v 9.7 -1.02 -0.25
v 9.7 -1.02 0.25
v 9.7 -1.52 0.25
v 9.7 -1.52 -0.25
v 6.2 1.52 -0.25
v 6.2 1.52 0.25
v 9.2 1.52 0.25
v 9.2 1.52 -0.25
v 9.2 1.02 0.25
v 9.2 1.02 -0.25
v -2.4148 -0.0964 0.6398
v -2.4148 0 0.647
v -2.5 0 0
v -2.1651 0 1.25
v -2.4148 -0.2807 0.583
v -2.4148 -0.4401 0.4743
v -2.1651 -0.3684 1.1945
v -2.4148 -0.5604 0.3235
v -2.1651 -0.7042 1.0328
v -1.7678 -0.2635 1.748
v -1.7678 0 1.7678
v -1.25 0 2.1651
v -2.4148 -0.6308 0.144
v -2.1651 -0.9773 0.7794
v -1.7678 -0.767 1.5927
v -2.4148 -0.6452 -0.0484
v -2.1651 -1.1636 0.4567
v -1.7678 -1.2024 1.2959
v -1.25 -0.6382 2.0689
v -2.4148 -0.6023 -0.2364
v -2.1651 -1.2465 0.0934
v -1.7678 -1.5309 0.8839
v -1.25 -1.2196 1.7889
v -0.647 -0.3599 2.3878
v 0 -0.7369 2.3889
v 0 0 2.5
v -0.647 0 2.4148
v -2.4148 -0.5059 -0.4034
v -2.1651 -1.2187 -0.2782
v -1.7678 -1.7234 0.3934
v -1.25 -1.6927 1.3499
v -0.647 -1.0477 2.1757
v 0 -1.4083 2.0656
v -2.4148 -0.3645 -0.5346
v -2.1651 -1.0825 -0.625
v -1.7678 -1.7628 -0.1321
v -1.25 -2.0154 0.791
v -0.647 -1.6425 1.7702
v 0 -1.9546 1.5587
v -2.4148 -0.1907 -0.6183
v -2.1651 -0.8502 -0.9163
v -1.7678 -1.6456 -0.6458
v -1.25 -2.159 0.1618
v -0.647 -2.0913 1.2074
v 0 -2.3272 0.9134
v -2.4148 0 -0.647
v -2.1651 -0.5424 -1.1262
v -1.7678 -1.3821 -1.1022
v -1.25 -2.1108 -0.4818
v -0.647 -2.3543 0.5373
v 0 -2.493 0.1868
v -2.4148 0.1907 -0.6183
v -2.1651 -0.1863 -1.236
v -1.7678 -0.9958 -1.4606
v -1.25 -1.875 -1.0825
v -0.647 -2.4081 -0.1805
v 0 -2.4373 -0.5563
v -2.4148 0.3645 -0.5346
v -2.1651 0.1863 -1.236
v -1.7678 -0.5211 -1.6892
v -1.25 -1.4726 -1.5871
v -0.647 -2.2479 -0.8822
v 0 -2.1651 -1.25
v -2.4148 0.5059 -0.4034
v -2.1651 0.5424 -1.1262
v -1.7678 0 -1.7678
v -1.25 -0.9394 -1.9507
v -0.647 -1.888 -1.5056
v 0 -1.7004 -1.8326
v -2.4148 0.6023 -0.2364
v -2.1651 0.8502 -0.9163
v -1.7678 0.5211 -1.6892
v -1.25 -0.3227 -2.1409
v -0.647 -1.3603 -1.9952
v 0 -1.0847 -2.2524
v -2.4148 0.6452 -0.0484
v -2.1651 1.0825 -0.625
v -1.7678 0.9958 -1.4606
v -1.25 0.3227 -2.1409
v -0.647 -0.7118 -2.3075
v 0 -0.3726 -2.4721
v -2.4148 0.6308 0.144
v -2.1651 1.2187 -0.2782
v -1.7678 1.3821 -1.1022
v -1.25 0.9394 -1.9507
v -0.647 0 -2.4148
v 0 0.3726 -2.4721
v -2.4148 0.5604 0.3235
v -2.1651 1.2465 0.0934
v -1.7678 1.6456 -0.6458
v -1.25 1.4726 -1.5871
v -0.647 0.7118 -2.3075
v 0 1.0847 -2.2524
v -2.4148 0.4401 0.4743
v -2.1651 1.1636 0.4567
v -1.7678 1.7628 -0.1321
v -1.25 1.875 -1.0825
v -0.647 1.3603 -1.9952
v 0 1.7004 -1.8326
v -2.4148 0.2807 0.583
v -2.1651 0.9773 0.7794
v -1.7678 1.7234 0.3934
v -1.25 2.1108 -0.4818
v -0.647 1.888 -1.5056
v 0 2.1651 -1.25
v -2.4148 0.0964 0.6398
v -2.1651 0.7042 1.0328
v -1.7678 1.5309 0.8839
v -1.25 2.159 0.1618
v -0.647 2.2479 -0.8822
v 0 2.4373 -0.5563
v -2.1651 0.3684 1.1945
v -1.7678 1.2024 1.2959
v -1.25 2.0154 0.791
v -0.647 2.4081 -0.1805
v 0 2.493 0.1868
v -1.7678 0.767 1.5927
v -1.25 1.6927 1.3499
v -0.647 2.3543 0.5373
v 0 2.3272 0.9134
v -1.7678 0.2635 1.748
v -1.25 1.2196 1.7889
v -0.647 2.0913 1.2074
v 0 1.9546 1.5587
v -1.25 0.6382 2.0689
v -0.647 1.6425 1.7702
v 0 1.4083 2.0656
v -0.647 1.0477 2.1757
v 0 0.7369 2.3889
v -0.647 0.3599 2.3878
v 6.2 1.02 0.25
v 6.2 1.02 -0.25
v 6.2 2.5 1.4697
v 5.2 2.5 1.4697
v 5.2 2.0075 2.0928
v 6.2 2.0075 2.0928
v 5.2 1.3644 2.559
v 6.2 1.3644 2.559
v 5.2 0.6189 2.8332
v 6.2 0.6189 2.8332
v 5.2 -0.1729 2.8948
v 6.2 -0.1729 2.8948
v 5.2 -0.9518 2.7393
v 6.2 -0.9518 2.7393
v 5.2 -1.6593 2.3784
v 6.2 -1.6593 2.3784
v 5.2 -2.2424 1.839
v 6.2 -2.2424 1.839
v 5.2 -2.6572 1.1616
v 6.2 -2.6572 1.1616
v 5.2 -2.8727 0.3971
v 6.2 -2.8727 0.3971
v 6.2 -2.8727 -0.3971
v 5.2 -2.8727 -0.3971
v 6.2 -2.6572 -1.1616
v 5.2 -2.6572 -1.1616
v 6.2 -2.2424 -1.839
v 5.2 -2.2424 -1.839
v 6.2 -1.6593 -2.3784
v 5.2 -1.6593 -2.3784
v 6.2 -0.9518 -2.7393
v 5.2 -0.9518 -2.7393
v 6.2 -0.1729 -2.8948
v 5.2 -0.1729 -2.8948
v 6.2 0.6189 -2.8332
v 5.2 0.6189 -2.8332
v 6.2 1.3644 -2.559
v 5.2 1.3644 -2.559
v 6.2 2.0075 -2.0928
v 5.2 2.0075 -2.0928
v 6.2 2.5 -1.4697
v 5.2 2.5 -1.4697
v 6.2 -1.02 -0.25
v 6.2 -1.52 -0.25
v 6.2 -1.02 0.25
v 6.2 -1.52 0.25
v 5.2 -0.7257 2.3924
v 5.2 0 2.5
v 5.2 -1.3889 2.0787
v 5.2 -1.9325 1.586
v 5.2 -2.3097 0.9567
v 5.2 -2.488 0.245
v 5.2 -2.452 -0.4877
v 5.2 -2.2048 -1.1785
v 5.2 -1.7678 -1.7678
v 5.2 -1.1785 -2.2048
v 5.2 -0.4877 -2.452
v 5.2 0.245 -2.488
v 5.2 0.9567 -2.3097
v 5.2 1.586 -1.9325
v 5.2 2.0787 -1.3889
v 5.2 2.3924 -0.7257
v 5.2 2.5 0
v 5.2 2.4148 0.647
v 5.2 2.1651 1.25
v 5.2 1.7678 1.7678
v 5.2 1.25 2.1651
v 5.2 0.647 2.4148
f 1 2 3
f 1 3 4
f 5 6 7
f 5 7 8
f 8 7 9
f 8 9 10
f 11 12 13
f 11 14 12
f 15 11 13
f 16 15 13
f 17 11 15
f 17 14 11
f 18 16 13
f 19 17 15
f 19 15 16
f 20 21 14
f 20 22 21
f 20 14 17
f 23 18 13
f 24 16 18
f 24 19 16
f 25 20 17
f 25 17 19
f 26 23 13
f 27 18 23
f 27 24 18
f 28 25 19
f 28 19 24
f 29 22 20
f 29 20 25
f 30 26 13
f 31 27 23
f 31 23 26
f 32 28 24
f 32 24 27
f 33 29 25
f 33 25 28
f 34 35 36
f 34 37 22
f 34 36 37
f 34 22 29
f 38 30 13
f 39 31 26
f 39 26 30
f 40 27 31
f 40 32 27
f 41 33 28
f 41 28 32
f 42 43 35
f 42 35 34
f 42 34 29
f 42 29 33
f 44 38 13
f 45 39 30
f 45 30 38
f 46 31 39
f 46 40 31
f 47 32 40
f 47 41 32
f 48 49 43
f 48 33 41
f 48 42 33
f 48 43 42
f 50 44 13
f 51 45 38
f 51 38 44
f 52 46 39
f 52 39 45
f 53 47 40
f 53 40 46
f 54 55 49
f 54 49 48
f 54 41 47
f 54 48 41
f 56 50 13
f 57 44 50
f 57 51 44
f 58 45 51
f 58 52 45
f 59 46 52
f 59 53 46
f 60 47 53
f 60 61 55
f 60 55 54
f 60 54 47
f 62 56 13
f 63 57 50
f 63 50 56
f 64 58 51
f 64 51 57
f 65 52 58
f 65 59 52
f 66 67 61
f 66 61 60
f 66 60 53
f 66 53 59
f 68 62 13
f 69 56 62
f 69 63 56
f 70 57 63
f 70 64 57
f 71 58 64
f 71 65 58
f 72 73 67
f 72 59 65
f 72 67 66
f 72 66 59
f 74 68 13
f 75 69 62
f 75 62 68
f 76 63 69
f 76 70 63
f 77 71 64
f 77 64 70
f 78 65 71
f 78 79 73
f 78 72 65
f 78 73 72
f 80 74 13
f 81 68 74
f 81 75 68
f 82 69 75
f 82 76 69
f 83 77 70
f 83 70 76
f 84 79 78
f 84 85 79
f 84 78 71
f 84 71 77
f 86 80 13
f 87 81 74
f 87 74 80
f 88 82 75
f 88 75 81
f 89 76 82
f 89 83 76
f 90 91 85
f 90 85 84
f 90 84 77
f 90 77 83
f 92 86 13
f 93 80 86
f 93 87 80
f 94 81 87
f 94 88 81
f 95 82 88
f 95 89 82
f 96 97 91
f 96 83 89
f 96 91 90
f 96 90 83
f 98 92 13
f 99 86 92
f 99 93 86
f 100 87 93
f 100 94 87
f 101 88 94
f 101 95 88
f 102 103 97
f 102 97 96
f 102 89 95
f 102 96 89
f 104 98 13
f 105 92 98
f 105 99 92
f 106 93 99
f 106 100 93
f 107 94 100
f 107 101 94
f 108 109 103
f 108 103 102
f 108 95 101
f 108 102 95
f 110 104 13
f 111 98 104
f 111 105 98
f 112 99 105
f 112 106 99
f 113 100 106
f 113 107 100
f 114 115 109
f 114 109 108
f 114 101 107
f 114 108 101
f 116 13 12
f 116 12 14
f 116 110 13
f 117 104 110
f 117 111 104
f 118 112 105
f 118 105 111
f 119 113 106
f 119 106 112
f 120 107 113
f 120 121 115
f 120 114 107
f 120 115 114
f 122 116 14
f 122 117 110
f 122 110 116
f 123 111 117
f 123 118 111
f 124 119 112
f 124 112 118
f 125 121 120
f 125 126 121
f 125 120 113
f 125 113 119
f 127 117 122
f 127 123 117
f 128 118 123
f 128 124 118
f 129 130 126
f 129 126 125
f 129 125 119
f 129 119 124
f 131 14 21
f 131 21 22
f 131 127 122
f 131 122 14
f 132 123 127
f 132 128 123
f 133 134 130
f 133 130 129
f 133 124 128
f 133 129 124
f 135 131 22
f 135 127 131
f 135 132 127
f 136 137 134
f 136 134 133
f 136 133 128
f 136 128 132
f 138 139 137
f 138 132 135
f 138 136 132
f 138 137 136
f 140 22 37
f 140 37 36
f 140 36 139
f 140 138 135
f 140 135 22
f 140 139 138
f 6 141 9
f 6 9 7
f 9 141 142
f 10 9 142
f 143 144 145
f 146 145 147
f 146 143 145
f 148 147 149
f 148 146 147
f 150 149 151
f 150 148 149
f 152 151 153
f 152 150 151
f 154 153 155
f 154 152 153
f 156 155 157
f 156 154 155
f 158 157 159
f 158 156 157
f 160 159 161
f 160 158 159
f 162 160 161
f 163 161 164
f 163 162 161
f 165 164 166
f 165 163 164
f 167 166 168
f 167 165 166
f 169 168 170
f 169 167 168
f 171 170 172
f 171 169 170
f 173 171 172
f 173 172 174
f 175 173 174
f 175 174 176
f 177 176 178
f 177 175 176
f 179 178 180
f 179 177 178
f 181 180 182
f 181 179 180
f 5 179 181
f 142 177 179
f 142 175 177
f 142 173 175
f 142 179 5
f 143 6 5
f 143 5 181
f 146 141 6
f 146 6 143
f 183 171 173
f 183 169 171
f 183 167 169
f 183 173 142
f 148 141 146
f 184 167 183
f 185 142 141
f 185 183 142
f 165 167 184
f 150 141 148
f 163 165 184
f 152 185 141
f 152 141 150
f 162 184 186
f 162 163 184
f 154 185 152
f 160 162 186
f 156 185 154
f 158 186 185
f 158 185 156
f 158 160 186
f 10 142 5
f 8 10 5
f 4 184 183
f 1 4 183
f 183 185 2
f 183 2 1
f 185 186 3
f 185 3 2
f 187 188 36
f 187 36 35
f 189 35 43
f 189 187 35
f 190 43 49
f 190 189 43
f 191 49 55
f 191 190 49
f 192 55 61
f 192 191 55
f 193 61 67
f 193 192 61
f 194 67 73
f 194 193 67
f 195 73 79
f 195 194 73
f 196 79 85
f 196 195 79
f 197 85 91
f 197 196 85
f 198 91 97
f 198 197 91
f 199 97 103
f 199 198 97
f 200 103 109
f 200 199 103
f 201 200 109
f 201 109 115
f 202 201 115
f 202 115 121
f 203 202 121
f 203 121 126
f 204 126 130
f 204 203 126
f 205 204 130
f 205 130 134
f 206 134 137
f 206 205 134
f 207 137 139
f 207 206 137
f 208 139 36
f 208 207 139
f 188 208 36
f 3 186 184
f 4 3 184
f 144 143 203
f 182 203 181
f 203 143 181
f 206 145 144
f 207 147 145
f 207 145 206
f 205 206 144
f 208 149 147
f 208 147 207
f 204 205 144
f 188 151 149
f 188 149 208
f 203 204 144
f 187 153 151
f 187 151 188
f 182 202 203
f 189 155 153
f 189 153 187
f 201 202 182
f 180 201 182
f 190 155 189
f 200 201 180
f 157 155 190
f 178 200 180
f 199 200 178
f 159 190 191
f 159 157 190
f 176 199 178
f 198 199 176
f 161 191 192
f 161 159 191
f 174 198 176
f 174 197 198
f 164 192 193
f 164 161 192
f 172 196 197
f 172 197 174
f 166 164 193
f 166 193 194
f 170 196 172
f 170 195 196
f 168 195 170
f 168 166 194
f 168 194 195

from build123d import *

# Parameters (mm, degrees)
CUT_EXTRUDE_1_REACH = 11.618
SKETCH_2_W          = 0.5
SKETCH_2_H          = 0.5
EXTRUDE_1_DEPTH     = 3.5
SKETCH_2_3_W        = 0.5
SKETCH_2_3_H        = 0.5
EXTRUDE_2_DEPTH     = 3


with BuildPart() as part:
    # 草图1 → 旋转1 (revolve)
    with BuildSketch(Plane.XY):
        with BuildLine():
            Line((0, 2.5), (5.2, 2.5))
            Line((5.2, 2.5), (5.2, 2.9))
            Line((5.2, 2.9), (6.2, 2.9))
            Line((6.2, 2.9), (6.2, 2.5))
            Line((6.2, 2.5), (6.2, 0))
            Line((6.2, 0), (-2.5, 0))
            ThreePointArc((-2.5, 0), (-1.767766953, 1.767766953), (0, 2.5))
        make_face()
    revolve(axis=Axis((-3.104685715, 0, 0), (1, 0, 0)))

    # 草图4 → 切除-拉伸1 (cut, up to next)
    with BuildSketch(Plane(origin=(6.2, 0, 0), x_dir=(0, 0, -1), z_dir=(1, 0, 0)), mode=Mode.PRIVATE) as cut_extrude_1_sk1:
        with BuildLine():
            Line((-1.469693846, 2.5), (1.469693846, 2.5))
            ThreePointArc((1.469693846, 2.5), (0, 2.9), (-1.469693846, 2.5))
        make_face()
    cut_extrude_1_tool1 = extrude(cut_extrude_1_sk1.sketch, amount=-CUT_EXTRUDE_1_REACH, mode=Mode.PRIVATE) & part.part
    add(cut_extrude_1_tool1.solids().sort_by_distance((6.2, 2.660985, 0))[0], mode=Mode.SUBTRACT)

    # 草图2 → 凸台-拉伸1 (add)
    with BuildSketch(Plane(origin=(6.2, 0, 0), x_dir=(0, 0, -1), z_dir=(1, 0, 0))):
        with Locations((0, -1.27)):
            Rectangle(SKETCH_2_W, SKETCH_2_H)
    extrude(amount=EXTRUDE_1_DEPTH)

    # 草图2<3> → 凸台-拉伸2 (add)
    with BuildSketch(Plane(origin=(6.2, 0, 0), x_dir=(0, 0, -1), z_dir=(1, 0, 0))):
        with Locations((0, 1.27)):
            Rectangle(SKETCH_2_3_W, SKETCH_2_3_H)
    extrude(amount=EXTRUDE_2_DEPTH)


solid = part.part
